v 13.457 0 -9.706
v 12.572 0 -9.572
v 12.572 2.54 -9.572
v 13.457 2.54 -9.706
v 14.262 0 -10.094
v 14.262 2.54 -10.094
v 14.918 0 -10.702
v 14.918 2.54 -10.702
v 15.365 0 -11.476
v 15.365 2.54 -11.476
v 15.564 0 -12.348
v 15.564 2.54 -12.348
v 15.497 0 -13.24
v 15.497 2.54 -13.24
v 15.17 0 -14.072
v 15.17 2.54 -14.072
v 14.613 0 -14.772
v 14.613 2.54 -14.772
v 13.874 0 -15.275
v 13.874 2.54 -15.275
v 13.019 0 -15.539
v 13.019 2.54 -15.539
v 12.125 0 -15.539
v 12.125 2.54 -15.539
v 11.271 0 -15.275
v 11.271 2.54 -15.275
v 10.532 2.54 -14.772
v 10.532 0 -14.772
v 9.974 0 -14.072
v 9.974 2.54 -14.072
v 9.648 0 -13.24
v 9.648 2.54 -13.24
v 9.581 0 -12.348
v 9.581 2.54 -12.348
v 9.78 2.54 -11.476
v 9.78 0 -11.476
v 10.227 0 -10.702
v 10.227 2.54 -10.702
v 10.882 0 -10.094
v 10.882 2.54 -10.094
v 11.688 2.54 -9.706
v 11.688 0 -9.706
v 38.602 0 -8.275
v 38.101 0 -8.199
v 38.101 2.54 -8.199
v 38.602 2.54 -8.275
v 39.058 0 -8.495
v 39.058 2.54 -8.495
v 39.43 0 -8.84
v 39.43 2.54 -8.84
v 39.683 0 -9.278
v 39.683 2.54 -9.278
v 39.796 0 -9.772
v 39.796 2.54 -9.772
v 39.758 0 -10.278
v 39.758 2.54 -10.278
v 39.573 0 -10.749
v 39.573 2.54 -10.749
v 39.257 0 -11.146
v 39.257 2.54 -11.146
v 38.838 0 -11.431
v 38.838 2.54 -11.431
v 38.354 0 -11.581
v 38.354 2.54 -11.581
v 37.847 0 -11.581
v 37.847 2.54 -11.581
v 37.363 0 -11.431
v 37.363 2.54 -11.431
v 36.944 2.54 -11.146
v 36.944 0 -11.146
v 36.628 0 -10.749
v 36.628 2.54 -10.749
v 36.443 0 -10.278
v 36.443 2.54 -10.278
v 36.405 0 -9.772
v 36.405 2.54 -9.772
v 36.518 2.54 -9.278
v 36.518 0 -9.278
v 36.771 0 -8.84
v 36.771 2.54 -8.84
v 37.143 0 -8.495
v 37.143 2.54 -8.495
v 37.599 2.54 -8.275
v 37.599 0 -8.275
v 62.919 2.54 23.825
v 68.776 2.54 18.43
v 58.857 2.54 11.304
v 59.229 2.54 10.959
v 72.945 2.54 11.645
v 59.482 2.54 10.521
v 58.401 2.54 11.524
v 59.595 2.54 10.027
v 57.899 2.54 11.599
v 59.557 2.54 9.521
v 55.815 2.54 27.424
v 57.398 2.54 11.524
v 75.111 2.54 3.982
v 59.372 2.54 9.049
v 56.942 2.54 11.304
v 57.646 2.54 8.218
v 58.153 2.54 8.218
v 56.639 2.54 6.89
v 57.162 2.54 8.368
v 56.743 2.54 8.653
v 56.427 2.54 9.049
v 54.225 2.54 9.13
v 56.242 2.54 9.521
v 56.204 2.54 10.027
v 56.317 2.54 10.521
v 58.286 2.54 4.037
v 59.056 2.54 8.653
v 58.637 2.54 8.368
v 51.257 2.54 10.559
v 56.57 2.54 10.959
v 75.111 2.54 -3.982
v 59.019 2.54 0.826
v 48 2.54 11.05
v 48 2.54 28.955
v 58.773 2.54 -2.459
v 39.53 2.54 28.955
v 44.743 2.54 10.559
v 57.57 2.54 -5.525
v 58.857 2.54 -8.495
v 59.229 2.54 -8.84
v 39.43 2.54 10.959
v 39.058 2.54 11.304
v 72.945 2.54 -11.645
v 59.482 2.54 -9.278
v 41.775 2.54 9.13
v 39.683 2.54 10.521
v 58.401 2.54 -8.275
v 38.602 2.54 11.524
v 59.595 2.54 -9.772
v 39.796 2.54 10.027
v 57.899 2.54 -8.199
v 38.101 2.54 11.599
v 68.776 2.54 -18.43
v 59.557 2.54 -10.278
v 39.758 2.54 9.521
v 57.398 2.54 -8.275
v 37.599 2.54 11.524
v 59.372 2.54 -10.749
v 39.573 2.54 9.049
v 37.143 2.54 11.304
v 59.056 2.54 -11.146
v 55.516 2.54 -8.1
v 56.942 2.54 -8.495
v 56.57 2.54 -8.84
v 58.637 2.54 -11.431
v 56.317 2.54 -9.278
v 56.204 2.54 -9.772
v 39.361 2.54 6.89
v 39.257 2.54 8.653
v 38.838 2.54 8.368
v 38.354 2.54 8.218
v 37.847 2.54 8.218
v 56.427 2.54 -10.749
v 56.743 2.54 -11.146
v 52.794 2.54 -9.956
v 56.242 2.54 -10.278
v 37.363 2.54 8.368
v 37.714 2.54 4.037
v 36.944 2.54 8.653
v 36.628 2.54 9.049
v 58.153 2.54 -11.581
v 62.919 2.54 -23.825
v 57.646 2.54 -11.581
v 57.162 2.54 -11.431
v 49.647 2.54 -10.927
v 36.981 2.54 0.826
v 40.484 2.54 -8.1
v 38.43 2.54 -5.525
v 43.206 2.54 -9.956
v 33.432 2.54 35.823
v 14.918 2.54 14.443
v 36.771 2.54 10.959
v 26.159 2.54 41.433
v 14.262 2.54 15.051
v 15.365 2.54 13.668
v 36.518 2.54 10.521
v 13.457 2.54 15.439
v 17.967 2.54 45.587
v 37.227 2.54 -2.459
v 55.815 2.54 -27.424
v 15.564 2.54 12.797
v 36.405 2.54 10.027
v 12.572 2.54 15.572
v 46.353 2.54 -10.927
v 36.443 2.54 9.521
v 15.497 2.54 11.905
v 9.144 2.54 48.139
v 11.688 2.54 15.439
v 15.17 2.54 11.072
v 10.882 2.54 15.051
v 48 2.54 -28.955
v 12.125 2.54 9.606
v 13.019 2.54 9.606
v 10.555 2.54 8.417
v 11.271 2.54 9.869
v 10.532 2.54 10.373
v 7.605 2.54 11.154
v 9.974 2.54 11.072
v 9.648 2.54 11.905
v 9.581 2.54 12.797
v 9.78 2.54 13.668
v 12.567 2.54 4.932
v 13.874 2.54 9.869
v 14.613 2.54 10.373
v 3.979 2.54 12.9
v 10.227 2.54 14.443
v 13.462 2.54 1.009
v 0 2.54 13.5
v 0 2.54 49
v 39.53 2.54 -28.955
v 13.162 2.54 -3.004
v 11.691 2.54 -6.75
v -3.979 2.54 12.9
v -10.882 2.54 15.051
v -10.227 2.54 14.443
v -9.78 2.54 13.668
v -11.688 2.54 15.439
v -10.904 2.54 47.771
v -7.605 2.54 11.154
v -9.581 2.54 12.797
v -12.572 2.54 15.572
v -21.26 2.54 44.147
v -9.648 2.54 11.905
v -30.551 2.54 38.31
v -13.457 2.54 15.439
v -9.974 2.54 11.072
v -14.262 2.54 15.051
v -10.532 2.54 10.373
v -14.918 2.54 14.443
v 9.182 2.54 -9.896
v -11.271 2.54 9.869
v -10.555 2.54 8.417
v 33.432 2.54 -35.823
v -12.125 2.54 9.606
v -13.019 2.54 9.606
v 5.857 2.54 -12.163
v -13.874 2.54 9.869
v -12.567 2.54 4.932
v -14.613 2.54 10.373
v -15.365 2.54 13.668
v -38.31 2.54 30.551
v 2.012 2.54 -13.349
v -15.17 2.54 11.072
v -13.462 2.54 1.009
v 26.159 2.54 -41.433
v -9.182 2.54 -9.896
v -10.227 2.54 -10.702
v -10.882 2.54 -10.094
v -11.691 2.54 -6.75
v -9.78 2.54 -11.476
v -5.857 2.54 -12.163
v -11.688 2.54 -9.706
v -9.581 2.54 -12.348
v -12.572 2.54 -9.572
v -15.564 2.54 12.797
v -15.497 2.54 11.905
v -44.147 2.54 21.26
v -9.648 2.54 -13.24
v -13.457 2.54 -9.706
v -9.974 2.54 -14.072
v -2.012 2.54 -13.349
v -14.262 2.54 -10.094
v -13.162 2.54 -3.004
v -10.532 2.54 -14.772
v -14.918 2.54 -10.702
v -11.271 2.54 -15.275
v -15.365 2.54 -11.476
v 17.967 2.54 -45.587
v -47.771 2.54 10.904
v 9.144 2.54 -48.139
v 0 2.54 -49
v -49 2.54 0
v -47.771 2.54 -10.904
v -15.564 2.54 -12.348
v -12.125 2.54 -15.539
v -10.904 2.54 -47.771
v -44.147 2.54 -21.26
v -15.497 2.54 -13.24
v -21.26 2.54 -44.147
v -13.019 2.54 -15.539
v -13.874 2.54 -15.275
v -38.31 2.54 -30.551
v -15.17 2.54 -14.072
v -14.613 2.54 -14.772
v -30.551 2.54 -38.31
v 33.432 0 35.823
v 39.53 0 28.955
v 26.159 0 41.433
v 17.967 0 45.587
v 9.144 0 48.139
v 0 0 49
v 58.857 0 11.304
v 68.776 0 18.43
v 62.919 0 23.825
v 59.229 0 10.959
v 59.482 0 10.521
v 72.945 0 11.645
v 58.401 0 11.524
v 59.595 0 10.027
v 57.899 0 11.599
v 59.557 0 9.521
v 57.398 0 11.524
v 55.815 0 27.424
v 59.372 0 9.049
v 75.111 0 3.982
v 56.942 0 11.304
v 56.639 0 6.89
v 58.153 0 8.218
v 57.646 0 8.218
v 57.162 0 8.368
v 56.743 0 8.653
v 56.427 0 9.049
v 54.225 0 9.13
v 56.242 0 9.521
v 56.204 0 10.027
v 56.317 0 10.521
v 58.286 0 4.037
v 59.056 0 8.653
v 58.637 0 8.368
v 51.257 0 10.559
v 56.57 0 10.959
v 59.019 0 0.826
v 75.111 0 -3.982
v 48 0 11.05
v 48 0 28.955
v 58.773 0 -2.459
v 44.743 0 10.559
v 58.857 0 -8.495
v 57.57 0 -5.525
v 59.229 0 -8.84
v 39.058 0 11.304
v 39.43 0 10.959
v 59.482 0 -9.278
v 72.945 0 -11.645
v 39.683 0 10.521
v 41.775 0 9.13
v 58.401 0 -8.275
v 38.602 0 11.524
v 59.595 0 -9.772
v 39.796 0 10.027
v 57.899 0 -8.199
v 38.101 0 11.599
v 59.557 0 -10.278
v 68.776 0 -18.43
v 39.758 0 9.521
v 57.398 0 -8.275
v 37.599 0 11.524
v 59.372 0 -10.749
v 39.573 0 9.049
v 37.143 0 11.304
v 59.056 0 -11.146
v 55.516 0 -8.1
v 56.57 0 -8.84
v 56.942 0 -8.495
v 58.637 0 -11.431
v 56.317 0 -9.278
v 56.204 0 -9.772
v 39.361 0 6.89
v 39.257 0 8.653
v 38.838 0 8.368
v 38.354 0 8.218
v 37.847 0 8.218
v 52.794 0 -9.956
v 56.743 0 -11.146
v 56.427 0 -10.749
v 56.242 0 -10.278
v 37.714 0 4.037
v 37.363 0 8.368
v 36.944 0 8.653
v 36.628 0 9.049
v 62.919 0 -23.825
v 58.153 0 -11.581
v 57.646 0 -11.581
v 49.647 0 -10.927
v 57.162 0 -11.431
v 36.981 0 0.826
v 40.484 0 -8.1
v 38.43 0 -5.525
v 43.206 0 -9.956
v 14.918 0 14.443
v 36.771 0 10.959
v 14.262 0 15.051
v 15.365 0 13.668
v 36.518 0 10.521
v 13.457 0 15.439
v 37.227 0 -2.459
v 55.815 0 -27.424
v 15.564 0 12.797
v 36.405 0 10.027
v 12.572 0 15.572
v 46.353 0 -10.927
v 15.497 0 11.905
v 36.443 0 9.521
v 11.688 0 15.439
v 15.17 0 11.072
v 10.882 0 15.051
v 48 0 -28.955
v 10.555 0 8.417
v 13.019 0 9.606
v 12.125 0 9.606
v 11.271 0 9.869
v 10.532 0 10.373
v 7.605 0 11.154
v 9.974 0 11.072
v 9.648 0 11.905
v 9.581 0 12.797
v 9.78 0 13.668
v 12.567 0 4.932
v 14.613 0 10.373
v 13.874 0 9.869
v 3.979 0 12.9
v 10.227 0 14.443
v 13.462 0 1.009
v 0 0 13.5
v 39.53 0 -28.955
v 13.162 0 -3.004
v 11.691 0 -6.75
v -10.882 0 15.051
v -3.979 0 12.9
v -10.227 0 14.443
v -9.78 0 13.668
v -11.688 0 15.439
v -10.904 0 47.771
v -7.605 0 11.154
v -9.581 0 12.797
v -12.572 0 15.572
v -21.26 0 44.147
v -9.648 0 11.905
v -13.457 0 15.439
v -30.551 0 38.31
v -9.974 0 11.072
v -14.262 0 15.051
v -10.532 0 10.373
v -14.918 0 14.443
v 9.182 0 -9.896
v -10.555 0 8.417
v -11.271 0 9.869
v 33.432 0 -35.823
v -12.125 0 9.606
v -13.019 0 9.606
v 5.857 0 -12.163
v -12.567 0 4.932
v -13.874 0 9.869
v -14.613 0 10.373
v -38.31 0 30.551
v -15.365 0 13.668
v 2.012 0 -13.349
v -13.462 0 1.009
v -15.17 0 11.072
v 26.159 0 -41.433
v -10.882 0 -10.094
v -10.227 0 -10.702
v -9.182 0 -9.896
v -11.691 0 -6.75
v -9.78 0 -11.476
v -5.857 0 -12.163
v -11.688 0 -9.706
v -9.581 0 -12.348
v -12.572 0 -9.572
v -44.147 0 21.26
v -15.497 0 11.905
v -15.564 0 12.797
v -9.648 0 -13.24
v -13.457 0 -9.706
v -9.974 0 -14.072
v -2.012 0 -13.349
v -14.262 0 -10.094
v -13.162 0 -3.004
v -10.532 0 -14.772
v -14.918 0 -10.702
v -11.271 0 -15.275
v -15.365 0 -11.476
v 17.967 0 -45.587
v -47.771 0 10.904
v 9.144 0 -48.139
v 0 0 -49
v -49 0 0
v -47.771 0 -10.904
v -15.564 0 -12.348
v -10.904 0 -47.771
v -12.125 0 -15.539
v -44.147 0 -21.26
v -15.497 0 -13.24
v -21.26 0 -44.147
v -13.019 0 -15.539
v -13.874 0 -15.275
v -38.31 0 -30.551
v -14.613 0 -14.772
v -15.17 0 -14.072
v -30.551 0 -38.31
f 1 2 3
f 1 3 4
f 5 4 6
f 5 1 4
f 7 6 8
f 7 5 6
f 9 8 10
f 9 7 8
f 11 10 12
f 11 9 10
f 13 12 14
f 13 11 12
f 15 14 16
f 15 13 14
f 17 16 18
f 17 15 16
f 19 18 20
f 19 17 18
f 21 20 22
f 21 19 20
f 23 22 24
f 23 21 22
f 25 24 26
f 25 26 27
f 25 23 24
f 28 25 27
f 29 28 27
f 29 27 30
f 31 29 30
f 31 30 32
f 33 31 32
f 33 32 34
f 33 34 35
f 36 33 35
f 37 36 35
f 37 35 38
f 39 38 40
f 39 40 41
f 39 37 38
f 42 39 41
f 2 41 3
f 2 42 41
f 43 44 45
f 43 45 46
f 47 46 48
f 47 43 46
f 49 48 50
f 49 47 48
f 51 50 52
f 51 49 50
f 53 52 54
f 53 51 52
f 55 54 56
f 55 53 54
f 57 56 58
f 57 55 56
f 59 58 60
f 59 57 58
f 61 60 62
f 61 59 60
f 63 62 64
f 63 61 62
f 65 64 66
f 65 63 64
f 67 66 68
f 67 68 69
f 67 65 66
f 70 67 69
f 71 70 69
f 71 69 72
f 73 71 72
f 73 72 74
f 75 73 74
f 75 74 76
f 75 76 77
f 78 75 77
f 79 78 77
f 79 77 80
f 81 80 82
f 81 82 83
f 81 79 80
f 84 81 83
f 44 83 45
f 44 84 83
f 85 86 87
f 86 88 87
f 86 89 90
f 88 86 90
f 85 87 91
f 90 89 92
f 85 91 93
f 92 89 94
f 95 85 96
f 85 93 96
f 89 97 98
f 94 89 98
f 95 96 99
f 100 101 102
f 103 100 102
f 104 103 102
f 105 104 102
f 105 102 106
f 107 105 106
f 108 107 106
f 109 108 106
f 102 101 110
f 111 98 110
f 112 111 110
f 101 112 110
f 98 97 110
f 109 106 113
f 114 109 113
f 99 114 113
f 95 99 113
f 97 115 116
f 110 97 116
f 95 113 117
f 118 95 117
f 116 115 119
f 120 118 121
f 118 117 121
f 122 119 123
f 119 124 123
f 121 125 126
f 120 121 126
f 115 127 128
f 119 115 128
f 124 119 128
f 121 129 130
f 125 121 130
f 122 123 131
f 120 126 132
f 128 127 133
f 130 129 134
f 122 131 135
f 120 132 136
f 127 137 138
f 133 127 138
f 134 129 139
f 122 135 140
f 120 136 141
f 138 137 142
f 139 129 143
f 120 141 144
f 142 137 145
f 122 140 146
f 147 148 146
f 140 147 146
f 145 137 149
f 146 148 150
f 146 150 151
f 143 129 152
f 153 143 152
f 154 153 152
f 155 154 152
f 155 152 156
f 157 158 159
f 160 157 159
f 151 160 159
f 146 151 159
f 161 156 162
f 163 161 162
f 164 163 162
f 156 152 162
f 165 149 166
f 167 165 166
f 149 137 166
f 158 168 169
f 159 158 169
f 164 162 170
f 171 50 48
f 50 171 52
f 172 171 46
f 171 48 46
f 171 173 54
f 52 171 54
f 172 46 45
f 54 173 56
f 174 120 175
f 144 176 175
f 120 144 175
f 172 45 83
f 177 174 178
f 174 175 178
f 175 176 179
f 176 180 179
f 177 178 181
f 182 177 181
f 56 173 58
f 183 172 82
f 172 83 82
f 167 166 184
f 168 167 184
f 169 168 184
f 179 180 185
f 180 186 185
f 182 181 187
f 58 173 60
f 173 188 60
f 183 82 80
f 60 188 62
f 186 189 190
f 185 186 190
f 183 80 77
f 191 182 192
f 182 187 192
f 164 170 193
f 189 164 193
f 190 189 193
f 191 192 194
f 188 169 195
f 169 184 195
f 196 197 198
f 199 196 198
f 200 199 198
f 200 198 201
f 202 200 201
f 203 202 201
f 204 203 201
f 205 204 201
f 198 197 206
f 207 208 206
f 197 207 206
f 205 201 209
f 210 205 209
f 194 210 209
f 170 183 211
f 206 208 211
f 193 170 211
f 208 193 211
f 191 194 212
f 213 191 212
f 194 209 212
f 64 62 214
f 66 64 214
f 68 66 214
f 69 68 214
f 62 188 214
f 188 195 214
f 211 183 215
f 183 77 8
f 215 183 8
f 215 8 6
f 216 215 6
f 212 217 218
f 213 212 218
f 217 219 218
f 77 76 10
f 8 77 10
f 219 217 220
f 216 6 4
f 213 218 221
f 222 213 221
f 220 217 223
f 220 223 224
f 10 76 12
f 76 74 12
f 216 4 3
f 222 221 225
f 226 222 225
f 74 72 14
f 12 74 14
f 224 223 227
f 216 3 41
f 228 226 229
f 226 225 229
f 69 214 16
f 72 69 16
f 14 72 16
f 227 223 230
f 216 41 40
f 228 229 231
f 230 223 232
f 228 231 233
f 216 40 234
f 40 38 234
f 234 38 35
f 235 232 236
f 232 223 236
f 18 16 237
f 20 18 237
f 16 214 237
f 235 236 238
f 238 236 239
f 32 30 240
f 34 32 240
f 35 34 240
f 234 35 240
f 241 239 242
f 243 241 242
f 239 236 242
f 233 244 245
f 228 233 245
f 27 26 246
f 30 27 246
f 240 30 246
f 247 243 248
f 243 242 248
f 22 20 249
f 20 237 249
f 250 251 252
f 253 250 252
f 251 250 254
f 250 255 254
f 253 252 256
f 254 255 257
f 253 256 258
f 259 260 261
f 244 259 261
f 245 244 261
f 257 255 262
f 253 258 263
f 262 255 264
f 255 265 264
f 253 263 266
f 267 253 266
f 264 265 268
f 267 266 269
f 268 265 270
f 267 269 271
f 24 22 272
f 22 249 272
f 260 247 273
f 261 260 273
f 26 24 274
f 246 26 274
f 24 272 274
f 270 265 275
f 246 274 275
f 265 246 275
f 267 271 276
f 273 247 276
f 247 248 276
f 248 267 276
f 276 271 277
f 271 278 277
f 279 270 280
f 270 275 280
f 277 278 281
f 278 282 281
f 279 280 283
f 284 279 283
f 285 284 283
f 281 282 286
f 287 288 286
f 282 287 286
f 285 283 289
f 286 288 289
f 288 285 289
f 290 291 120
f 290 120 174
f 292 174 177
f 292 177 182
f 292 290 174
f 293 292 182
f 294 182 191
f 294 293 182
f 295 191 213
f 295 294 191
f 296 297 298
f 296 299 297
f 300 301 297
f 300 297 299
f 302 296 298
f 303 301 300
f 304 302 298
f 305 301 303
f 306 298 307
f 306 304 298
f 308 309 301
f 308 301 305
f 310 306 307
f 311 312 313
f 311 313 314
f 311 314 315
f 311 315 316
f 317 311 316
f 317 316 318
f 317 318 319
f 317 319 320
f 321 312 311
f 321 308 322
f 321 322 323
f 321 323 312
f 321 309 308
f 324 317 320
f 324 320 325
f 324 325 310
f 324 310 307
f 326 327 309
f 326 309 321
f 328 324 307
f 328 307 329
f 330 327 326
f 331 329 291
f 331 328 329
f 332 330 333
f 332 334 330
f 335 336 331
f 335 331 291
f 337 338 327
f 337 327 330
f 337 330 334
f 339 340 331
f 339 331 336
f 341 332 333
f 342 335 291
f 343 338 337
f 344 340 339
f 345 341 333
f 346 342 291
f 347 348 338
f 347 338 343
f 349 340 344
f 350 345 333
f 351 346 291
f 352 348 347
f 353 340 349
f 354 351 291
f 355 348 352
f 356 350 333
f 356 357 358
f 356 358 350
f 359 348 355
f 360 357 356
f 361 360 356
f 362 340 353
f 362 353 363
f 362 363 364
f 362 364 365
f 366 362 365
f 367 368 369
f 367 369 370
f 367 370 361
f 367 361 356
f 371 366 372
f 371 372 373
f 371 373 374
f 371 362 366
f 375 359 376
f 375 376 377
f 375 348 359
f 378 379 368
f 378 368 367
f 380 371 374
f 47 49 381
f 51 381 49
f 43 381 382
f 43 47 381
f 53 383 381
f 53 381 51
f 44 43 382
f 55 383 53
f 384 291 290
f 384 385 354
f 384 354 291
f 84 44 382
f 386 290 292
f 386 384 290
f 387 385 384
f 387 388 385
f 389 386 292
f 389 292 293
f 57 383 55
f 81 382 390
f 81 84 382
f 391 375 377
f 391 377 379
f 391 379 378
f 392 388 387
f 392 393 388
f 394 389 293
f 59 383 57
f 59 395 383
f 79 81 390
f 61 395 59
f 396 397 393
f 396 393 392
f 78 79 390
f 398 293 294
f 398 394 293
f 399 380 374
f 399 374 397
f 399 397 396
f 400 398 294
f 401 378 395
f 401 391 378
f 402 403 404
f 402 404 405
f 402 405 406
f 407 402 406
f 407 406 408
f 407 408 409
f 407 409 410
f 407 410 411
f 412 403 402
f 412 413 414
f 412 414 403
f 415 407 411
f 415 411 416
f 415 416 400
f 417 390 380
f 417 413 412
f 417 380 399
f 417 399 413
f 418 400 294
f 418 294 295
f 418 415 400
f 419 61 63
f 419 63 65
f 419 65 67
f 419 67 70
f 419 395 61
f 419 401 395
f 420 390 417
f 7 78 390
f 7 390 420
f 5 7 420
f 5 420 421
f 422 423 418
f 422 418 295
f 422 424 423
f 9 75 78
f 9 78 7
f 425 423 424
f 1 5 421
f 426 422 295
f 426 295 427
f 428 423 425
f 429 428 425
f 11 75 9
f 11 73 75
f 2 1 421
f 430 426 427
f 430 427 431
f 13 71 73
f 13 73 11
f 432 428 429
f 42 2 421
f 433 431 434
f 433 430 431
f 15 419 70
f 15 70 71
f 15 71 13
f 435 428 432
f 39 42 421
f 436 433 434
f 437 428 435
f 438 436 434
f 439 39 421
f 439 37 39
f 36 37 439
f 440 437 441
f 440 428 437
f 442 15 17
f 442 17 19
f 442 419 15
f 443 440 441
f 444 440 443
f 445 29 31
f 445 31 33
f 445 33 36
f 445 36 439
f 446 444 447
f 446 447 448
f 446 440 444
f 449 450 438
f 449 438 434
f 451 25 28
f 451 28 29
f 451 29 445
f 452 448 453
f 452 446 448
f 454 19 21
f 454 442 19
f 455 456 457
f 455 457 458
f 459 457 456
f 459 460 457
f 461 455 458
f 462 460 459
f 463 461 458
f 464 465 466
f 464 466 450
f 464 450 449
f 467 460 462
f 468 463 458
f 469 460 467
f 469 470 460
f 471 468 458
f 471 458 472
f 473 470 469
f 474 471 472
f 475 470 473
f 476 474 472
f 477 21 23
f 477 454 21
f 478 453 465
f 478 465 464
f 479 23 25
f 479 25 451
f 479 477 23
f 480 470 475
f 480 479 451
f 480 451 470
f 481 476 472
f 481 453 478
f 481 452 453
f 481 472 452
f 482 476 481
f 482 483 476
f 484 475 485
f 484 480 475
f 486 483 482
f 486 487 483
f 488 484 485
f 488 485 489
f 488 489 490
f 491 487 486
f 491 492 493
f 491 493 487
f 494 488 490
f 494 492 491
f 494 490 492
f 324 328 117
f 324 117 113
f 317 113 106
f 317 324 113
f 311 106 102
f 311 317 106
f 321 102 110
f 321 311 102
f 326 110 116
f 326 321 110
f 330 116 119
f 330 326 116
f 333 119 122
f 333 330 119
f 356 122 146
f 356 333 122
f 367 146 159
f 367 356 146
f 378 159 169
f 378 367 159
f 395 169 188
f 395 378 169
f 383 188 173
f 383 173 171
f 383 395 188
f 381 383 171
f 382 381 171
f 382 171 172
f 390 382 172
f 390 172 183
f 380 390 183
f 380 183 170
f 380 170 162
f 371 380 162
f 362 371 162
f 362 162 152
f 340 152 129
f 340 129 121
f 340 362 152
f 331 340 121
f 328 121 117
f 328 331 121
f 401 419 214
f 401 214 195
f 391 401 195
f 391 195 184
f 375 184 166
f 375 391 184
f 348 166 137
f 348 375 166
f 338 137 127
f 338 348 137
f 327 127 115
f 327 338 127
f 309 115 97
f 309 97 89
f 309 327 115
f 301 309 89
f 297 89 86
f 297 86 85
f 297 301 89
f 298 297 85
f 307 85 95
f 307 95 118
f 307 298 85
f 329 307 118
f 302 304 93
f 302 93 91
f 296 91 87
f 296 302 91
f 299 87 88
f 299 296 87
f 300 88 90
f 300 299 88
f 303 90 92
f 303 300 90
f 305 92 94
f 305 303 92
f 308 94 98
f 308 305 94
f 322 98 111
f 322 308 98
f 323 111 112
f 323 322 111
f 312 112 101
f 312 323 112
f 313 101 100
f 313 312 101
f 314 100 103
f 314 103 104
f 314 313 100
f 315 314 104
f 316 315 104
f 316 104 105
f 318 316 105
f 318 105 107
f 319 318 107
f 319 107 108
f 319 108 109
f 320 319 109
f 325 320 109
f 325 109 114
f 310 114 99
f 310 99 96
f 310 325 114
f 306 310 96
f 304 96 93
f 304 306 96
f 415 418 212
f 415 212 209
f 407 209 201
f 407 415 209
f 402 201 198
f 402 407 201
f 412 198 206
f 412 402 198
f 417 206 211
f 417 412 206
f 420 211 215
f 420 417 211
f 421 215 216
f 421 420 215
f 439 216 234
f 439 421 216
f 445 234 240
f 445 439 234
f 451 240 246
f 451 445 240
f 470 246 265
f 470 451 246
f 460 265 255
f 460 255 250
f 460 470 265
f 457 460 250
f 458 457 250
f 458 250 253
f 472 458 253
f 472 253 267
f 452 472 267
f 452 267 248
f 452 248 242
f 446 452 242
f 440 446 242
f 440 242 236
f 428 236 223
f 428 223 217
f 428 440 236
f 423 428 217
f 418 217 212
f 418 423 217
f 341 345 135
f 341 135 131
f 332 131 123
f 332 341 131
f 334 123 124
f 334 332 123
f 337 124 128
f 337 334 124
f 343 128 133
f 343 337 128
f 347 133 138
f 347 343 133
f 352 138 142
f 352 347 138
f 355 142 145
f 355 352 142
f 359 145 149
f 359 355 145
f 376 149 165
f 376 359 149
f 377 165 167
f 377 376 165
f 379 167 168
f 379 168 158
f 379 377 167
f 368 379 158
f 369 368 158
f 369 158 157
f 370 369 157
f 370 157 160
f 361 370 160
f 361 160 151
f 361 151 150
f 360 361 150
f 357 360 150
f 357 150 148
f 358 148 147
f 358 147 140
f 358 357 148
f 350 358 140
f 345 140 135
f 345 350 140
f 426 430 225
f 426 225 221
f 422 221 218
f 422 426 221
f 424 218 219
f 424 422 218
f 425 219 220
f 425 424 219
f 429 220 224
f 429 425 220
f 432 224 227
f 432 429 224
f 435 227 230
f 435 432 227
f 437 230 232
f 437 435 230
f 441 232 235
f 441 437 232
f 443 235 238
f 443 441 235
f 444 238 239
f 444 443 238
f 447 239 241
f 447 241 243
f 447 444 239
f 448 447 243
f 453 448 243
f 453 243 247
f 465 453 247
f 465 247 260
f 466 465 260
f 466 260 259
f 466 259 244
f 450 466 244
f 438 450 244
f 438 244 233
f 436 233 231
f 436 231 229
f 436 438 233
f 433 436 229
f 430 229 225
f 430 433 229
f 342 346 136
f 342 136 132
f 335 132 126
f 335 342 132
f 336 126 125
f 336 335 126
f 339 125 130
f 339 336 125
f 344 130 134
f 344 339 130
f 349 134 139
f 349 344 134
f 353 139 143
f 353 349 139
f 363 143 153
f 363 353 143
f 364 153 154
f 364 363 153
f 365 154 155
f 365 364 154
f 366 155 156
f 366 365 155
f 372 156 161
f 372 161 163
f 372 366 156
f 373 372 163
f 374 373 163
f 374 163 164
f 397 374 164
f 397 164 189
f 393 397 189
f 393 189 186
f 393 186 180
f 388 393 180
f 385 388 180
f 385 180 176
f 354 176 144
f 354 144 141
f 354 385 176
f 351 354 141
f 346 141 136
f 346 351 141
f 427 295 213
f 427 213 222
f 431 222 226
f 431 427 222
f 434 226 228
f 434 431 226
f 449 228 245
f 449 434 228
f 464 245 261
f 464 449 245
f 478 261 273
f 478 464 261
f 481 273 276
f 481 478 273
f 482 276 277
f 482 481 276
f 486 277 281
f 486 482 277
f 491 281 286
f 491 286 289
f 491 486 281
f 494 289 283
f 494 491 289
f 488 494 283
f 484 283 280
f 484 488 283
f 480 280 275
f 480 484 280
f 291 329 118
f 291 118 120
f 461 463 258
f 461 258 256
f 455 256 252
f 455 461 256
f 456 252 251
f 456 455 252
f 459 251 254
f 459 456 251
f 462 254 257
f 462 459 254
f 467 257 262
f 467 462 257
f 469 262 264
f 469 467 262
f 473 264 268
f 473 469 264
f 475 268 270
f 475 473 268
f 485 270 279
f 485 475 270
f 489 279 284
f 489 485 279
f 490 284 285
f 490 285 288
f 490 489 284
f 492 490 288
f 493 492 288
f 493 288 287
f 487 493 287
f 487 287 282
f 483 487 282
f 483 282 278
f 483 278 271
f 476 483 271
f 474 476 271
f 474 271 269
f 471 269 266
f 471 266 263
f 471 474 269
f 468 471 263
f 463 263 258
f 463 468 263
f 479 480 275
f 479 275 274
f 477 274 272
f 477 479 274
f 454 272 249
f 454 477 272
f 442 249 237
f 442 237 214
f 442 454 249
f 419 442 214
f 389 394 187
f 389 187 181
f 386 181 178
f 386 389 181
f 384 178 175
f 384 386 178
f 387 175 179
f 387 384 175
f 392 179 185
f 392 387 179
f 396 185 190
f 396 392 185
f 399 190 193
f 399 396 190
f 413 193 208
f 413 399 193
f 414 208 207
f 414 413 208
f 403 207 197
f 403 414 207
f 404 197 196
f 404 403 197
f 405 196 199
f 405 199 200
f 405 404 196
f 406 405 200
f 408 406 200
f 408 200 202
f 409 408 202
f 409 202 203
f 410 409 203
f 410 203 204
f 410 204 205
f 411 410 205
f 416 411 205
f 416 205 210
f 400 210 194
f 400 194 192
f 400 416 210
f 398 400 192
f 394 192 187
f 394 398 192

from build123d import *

# Parameters (mm, degrees)
SKETCH1_R           = 1.7
SKETCH1_R_2         = 13.5
SKETCH1_R_3         = 3
SKETCH1_R_4         = 11.05
BOSS_EXTRUDE1_DEPTH = 2.54


with BuildPart() as part:
    # Sketch1 → Boss-Extrude1 (new body)
    with BuildSketch(Plane(origin=(0, 0, 0), x_dir=(1, 0, 0), z_dir=(0, 1, 0))):
        with BuildLine():
            ThreePointArc((0, 49), (22.160822156, 43.702379356), (39.529822722, 28.955018831))
            Line((39.529822722, 28.955018831), (48, 28.955018831))
            ThreePointArc((48, 28.955018831), (75.385415079, 0), (48, -28.955018831))
            Line((48, -28.955018831), (39.529822722, -28.955018831))
            ThreePointArc((39.529822722, -28.955018831), (22.160822156, -43.702379356), (0, -49))
            ThreePointArc((0, -49), (-49, 0), (0, 49))
        make_face()
        with Locations(Location((38.100505063, -9.899494937, 0), (0, 0, 270))):
            Circle(SKETCH1_R, mode=Mode.SUBTRACT)
        with Locations(Location((57.899494937, -9.899494937, 0), (0, 0, 270))):
            Circle(SKETCH1_R, mode=Mode.SUBTRACT)
        with Locations(Location((57.899494937, 9.899494937, 0), (0, 0, 270))):
            Circle(SKETCH1_R, mode=Mode.SUBTRACT)
        with Locations(Location((38.100505063, 9.899494937, 0), (0, 0, 270))):
            Circle(SKETCH1_R, mode=Mode.SUBTRACT)
        with Locations(Location((0, 0, 0), (0, 0, 270))):
            Circle(SKETCH1_R_2, mode=Mode.SUBTRACT)
        with Locations(Location((-12.572358569, -12.572358569, 0), (0, 0, 270))):
            Circle(SKETCH1_R_3, mode=Mode.SUBTRACT)
        with Locations(Location((12.572358569, -12.572358569, 0), (0, 0, 270))):
            Circle(SKETCH1_R_3, mode=Mode.SUBTRACT)
        with Locations(Location((12.572358569, 12.572358569, 0), (0, 0, 270))):
            Circle(SKETCH1_R_3, mode=Mode.SUBTRACT)
        with Locations(Location((-12.572358569, 12.572358569, 0), (0, 0, 270))):
            Circle(SKETCH1_R_3, mode=Mode.SUBTRACT)
        with Locations(Location((48, 0, 0), (0, 0, 270))):
            Circle(SKETCH1_R_4, mode=Mode.SUBTRACT)
    extrude(amount=BOSS_EXTRUDE1_DEPTH)


solid = part.part
